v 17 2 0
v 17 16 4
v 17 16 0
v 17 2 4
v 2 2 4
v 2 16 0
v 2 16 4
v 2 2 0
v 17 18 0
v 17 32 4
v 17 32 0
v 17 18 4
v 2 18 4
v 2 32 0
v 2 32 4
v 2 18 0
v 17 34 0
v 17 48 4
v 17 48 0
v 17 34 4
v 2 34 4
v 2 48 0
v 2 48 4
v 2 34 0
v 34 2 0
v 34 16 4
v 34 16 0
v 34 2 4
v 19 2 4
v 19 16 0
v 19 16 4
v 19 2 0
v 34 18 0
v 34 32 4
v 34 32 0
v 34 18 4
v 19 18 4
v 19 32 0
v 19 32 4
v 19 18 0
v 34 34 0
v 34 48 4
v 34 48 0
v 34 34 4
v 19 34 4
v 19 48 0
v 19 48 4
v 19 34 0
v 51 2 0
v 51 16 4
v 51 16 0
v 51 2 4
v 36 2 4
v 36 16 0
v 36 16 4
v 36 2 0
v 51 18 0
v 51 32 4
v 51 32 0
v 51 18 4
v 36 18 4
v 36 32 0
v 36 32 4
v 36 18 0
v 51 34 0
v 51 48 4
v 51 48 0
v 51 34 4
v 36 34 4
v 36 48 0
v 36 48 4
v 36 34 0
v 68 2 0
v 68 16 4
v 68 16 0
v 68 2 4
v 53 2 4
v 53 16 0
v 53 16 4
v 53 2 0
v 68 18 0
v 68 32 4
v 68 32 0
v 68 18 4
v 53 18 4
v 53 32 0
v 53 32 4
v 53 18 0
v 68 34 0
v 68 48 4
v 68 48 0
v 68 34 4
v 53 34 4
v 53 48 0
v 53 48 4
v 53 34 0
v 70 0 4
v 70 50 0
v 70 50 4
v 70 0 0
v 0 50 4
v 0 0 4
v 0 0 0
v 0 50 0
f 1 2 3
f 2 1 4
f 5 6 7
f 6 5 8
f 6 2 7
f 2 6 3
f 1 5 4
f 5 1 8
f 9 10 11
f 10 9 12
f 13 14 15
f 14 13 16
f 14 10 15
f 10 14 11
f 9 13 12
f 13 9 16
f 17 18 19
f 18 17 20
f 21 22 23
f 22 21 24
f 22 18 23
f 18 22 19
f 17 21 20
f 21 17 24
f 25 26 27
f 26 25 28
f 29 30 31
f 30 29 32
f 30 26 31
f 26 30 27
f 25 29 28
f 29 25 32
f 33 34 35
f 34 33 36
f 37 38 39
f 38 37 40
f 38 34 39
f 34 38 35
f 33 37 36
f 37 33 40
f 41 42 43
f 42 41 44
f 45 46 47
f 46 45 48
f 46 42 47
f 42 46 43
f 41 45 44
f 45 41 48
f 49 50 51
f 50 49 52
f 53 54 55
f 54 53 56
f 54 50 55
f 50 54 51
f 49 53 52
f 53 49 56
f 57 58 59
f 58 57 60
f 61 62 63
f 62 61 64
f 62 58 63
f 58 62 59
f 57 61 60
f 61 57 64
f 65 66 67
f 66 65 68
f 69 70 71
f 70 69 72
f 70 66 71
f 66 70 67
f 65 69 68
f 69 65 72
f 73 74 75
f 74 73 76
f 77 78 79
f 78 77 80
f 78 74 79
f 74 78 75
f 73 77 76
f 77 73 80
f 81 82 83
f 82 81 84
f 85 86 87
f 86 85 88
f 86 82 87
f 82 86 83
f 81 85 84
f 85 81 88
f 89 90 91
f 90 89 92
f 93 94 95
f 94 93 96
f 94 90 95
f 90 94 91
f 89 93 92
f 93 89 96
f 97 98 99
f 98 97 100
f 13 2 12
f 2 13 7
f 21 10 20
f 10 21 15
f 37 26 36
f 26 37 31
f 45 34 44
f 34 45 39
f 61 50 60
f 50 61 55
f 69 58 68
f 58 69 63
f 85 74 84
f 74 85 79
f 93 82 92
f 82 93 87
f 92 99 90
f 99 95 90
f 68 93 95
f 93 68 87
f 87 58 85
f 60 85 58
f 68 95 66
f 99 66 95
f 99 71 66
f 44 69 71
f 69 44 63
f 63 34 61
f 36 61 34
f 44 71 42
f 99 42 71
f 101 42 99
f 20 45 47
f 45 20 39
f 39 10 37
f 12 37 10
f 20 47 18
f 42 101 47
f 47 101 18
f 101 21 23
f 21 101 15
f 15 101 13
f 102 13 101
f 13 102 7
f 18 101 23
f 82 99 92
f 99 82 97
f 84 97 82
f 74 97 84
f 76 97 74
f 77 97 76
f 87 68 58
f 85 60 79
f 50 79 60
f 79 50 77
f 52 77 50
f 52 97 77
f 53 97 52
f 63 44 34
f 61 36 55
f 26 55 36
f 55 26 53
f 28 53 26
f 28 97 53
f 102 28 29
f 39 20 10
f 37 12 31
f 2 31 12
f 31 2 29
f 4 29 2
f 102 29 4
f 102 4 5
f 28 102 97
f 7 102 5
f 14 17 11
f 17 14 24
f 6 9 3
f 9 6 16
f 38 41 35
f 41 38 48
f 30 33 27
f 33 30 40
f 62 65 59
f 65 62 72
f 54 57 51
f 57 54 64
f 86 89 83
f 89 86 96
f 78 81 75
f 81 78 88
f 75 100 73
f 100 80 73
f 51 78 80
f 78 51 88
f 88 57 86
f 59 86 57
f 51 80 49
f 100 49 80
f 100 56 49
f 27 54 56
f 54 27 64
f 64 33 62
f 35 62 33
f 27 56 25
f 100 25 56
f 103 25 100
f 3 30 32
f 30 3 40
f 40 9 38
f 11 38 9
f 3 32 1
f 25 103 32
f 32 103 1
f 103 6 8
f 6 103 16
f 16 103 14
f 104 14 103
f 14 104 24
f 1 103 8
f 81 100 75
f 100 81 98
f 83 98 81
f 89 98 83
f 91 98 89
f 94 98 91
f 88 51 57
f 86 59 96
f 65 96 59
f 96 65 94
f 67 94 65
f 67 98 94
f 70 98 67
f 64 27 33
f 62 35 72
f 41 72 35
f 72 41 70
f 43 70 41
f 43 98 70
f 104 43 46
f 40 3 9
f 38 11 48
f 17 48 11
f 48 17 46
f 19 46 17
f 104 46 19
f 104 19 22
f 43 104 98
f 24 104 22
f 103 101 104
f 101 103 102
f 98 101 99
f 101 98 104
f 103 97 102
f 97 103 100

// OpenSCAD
// ============================================================
// Lightened mounting plate — 70 x 50 x 4.0 mm
// One solid body (perimeter frame + 2 mm rib grid, windows cut through)
// All walls >= 2 mm.  Printed mass < 50% of a solid plate of equal size.
// Units: mm
// ============================================================

// ---- Parameters ----
L      = 70;    // outer length  (X)
W      = 50;    // outer width   (Y)
T      = 4.0;   // thickness     (Z)
border = 2.0;   // perimeter wall thickness  (>= 2 mm)
rib    = 2.0;   // internal rib thickness    (>= 2 mm)
ncx    = 4;     // window columns
ncy    = 3;     // window rows
$fn    = 48;

// ---- Derived window sizing (fills interior exactly) ----
inner_L = L - 2*border;                       // 66
inner_W = W - 2*border;                        // 46
win_w   = (inner_L - (ncx-1)*rib) / ncx;       // window size in X
win_h   = (inner_W - (ncy-1)*rib) / ncy;       // window size in Y

// ---- Geometry ----
difference() {
    // solid stock
    cube([L, W, T]);

    // array of through windows (oversized in Z so the cut is clean)
    for (i = [0:ncx-1])
        for (j = [0:ncy-1])
            translate([ border + i*(win_w + rib),
                       border + j*(win_h + rib),
                       -1 ])
                cube([win_w, win_h, T + 2]);
}

// ============================================================
// MASS / LIGHTENING MANIFEST  (same material => mass ratio = volume ratio)
// ============================================================
solid_vol   = L * W * T;                       // mm^3
window_vol  = ncx * ncy * win_w * win_h * T;   // removed material
part_vol    = solid_vol - window_vol;          // printed solid volume
frac        = part_vol / solid_vol;

echo(str("Window size (mm): ", win_w, " x ", win_h, " x ", T));
echo(str("Min wall / rib (mm): ", min(border, rib), "  (requirement >= 2.0)"));
echo(str("Solid volume (mm^3):   ", solid_vol));
echo(str("Removed volume (mm^3): ", window_vol));
echo(str("Printed volume (mm^3): ", part_vol));
echo(str("Mass fraction of solid: ", frac*100, " %  (requirement < 50%)"));
